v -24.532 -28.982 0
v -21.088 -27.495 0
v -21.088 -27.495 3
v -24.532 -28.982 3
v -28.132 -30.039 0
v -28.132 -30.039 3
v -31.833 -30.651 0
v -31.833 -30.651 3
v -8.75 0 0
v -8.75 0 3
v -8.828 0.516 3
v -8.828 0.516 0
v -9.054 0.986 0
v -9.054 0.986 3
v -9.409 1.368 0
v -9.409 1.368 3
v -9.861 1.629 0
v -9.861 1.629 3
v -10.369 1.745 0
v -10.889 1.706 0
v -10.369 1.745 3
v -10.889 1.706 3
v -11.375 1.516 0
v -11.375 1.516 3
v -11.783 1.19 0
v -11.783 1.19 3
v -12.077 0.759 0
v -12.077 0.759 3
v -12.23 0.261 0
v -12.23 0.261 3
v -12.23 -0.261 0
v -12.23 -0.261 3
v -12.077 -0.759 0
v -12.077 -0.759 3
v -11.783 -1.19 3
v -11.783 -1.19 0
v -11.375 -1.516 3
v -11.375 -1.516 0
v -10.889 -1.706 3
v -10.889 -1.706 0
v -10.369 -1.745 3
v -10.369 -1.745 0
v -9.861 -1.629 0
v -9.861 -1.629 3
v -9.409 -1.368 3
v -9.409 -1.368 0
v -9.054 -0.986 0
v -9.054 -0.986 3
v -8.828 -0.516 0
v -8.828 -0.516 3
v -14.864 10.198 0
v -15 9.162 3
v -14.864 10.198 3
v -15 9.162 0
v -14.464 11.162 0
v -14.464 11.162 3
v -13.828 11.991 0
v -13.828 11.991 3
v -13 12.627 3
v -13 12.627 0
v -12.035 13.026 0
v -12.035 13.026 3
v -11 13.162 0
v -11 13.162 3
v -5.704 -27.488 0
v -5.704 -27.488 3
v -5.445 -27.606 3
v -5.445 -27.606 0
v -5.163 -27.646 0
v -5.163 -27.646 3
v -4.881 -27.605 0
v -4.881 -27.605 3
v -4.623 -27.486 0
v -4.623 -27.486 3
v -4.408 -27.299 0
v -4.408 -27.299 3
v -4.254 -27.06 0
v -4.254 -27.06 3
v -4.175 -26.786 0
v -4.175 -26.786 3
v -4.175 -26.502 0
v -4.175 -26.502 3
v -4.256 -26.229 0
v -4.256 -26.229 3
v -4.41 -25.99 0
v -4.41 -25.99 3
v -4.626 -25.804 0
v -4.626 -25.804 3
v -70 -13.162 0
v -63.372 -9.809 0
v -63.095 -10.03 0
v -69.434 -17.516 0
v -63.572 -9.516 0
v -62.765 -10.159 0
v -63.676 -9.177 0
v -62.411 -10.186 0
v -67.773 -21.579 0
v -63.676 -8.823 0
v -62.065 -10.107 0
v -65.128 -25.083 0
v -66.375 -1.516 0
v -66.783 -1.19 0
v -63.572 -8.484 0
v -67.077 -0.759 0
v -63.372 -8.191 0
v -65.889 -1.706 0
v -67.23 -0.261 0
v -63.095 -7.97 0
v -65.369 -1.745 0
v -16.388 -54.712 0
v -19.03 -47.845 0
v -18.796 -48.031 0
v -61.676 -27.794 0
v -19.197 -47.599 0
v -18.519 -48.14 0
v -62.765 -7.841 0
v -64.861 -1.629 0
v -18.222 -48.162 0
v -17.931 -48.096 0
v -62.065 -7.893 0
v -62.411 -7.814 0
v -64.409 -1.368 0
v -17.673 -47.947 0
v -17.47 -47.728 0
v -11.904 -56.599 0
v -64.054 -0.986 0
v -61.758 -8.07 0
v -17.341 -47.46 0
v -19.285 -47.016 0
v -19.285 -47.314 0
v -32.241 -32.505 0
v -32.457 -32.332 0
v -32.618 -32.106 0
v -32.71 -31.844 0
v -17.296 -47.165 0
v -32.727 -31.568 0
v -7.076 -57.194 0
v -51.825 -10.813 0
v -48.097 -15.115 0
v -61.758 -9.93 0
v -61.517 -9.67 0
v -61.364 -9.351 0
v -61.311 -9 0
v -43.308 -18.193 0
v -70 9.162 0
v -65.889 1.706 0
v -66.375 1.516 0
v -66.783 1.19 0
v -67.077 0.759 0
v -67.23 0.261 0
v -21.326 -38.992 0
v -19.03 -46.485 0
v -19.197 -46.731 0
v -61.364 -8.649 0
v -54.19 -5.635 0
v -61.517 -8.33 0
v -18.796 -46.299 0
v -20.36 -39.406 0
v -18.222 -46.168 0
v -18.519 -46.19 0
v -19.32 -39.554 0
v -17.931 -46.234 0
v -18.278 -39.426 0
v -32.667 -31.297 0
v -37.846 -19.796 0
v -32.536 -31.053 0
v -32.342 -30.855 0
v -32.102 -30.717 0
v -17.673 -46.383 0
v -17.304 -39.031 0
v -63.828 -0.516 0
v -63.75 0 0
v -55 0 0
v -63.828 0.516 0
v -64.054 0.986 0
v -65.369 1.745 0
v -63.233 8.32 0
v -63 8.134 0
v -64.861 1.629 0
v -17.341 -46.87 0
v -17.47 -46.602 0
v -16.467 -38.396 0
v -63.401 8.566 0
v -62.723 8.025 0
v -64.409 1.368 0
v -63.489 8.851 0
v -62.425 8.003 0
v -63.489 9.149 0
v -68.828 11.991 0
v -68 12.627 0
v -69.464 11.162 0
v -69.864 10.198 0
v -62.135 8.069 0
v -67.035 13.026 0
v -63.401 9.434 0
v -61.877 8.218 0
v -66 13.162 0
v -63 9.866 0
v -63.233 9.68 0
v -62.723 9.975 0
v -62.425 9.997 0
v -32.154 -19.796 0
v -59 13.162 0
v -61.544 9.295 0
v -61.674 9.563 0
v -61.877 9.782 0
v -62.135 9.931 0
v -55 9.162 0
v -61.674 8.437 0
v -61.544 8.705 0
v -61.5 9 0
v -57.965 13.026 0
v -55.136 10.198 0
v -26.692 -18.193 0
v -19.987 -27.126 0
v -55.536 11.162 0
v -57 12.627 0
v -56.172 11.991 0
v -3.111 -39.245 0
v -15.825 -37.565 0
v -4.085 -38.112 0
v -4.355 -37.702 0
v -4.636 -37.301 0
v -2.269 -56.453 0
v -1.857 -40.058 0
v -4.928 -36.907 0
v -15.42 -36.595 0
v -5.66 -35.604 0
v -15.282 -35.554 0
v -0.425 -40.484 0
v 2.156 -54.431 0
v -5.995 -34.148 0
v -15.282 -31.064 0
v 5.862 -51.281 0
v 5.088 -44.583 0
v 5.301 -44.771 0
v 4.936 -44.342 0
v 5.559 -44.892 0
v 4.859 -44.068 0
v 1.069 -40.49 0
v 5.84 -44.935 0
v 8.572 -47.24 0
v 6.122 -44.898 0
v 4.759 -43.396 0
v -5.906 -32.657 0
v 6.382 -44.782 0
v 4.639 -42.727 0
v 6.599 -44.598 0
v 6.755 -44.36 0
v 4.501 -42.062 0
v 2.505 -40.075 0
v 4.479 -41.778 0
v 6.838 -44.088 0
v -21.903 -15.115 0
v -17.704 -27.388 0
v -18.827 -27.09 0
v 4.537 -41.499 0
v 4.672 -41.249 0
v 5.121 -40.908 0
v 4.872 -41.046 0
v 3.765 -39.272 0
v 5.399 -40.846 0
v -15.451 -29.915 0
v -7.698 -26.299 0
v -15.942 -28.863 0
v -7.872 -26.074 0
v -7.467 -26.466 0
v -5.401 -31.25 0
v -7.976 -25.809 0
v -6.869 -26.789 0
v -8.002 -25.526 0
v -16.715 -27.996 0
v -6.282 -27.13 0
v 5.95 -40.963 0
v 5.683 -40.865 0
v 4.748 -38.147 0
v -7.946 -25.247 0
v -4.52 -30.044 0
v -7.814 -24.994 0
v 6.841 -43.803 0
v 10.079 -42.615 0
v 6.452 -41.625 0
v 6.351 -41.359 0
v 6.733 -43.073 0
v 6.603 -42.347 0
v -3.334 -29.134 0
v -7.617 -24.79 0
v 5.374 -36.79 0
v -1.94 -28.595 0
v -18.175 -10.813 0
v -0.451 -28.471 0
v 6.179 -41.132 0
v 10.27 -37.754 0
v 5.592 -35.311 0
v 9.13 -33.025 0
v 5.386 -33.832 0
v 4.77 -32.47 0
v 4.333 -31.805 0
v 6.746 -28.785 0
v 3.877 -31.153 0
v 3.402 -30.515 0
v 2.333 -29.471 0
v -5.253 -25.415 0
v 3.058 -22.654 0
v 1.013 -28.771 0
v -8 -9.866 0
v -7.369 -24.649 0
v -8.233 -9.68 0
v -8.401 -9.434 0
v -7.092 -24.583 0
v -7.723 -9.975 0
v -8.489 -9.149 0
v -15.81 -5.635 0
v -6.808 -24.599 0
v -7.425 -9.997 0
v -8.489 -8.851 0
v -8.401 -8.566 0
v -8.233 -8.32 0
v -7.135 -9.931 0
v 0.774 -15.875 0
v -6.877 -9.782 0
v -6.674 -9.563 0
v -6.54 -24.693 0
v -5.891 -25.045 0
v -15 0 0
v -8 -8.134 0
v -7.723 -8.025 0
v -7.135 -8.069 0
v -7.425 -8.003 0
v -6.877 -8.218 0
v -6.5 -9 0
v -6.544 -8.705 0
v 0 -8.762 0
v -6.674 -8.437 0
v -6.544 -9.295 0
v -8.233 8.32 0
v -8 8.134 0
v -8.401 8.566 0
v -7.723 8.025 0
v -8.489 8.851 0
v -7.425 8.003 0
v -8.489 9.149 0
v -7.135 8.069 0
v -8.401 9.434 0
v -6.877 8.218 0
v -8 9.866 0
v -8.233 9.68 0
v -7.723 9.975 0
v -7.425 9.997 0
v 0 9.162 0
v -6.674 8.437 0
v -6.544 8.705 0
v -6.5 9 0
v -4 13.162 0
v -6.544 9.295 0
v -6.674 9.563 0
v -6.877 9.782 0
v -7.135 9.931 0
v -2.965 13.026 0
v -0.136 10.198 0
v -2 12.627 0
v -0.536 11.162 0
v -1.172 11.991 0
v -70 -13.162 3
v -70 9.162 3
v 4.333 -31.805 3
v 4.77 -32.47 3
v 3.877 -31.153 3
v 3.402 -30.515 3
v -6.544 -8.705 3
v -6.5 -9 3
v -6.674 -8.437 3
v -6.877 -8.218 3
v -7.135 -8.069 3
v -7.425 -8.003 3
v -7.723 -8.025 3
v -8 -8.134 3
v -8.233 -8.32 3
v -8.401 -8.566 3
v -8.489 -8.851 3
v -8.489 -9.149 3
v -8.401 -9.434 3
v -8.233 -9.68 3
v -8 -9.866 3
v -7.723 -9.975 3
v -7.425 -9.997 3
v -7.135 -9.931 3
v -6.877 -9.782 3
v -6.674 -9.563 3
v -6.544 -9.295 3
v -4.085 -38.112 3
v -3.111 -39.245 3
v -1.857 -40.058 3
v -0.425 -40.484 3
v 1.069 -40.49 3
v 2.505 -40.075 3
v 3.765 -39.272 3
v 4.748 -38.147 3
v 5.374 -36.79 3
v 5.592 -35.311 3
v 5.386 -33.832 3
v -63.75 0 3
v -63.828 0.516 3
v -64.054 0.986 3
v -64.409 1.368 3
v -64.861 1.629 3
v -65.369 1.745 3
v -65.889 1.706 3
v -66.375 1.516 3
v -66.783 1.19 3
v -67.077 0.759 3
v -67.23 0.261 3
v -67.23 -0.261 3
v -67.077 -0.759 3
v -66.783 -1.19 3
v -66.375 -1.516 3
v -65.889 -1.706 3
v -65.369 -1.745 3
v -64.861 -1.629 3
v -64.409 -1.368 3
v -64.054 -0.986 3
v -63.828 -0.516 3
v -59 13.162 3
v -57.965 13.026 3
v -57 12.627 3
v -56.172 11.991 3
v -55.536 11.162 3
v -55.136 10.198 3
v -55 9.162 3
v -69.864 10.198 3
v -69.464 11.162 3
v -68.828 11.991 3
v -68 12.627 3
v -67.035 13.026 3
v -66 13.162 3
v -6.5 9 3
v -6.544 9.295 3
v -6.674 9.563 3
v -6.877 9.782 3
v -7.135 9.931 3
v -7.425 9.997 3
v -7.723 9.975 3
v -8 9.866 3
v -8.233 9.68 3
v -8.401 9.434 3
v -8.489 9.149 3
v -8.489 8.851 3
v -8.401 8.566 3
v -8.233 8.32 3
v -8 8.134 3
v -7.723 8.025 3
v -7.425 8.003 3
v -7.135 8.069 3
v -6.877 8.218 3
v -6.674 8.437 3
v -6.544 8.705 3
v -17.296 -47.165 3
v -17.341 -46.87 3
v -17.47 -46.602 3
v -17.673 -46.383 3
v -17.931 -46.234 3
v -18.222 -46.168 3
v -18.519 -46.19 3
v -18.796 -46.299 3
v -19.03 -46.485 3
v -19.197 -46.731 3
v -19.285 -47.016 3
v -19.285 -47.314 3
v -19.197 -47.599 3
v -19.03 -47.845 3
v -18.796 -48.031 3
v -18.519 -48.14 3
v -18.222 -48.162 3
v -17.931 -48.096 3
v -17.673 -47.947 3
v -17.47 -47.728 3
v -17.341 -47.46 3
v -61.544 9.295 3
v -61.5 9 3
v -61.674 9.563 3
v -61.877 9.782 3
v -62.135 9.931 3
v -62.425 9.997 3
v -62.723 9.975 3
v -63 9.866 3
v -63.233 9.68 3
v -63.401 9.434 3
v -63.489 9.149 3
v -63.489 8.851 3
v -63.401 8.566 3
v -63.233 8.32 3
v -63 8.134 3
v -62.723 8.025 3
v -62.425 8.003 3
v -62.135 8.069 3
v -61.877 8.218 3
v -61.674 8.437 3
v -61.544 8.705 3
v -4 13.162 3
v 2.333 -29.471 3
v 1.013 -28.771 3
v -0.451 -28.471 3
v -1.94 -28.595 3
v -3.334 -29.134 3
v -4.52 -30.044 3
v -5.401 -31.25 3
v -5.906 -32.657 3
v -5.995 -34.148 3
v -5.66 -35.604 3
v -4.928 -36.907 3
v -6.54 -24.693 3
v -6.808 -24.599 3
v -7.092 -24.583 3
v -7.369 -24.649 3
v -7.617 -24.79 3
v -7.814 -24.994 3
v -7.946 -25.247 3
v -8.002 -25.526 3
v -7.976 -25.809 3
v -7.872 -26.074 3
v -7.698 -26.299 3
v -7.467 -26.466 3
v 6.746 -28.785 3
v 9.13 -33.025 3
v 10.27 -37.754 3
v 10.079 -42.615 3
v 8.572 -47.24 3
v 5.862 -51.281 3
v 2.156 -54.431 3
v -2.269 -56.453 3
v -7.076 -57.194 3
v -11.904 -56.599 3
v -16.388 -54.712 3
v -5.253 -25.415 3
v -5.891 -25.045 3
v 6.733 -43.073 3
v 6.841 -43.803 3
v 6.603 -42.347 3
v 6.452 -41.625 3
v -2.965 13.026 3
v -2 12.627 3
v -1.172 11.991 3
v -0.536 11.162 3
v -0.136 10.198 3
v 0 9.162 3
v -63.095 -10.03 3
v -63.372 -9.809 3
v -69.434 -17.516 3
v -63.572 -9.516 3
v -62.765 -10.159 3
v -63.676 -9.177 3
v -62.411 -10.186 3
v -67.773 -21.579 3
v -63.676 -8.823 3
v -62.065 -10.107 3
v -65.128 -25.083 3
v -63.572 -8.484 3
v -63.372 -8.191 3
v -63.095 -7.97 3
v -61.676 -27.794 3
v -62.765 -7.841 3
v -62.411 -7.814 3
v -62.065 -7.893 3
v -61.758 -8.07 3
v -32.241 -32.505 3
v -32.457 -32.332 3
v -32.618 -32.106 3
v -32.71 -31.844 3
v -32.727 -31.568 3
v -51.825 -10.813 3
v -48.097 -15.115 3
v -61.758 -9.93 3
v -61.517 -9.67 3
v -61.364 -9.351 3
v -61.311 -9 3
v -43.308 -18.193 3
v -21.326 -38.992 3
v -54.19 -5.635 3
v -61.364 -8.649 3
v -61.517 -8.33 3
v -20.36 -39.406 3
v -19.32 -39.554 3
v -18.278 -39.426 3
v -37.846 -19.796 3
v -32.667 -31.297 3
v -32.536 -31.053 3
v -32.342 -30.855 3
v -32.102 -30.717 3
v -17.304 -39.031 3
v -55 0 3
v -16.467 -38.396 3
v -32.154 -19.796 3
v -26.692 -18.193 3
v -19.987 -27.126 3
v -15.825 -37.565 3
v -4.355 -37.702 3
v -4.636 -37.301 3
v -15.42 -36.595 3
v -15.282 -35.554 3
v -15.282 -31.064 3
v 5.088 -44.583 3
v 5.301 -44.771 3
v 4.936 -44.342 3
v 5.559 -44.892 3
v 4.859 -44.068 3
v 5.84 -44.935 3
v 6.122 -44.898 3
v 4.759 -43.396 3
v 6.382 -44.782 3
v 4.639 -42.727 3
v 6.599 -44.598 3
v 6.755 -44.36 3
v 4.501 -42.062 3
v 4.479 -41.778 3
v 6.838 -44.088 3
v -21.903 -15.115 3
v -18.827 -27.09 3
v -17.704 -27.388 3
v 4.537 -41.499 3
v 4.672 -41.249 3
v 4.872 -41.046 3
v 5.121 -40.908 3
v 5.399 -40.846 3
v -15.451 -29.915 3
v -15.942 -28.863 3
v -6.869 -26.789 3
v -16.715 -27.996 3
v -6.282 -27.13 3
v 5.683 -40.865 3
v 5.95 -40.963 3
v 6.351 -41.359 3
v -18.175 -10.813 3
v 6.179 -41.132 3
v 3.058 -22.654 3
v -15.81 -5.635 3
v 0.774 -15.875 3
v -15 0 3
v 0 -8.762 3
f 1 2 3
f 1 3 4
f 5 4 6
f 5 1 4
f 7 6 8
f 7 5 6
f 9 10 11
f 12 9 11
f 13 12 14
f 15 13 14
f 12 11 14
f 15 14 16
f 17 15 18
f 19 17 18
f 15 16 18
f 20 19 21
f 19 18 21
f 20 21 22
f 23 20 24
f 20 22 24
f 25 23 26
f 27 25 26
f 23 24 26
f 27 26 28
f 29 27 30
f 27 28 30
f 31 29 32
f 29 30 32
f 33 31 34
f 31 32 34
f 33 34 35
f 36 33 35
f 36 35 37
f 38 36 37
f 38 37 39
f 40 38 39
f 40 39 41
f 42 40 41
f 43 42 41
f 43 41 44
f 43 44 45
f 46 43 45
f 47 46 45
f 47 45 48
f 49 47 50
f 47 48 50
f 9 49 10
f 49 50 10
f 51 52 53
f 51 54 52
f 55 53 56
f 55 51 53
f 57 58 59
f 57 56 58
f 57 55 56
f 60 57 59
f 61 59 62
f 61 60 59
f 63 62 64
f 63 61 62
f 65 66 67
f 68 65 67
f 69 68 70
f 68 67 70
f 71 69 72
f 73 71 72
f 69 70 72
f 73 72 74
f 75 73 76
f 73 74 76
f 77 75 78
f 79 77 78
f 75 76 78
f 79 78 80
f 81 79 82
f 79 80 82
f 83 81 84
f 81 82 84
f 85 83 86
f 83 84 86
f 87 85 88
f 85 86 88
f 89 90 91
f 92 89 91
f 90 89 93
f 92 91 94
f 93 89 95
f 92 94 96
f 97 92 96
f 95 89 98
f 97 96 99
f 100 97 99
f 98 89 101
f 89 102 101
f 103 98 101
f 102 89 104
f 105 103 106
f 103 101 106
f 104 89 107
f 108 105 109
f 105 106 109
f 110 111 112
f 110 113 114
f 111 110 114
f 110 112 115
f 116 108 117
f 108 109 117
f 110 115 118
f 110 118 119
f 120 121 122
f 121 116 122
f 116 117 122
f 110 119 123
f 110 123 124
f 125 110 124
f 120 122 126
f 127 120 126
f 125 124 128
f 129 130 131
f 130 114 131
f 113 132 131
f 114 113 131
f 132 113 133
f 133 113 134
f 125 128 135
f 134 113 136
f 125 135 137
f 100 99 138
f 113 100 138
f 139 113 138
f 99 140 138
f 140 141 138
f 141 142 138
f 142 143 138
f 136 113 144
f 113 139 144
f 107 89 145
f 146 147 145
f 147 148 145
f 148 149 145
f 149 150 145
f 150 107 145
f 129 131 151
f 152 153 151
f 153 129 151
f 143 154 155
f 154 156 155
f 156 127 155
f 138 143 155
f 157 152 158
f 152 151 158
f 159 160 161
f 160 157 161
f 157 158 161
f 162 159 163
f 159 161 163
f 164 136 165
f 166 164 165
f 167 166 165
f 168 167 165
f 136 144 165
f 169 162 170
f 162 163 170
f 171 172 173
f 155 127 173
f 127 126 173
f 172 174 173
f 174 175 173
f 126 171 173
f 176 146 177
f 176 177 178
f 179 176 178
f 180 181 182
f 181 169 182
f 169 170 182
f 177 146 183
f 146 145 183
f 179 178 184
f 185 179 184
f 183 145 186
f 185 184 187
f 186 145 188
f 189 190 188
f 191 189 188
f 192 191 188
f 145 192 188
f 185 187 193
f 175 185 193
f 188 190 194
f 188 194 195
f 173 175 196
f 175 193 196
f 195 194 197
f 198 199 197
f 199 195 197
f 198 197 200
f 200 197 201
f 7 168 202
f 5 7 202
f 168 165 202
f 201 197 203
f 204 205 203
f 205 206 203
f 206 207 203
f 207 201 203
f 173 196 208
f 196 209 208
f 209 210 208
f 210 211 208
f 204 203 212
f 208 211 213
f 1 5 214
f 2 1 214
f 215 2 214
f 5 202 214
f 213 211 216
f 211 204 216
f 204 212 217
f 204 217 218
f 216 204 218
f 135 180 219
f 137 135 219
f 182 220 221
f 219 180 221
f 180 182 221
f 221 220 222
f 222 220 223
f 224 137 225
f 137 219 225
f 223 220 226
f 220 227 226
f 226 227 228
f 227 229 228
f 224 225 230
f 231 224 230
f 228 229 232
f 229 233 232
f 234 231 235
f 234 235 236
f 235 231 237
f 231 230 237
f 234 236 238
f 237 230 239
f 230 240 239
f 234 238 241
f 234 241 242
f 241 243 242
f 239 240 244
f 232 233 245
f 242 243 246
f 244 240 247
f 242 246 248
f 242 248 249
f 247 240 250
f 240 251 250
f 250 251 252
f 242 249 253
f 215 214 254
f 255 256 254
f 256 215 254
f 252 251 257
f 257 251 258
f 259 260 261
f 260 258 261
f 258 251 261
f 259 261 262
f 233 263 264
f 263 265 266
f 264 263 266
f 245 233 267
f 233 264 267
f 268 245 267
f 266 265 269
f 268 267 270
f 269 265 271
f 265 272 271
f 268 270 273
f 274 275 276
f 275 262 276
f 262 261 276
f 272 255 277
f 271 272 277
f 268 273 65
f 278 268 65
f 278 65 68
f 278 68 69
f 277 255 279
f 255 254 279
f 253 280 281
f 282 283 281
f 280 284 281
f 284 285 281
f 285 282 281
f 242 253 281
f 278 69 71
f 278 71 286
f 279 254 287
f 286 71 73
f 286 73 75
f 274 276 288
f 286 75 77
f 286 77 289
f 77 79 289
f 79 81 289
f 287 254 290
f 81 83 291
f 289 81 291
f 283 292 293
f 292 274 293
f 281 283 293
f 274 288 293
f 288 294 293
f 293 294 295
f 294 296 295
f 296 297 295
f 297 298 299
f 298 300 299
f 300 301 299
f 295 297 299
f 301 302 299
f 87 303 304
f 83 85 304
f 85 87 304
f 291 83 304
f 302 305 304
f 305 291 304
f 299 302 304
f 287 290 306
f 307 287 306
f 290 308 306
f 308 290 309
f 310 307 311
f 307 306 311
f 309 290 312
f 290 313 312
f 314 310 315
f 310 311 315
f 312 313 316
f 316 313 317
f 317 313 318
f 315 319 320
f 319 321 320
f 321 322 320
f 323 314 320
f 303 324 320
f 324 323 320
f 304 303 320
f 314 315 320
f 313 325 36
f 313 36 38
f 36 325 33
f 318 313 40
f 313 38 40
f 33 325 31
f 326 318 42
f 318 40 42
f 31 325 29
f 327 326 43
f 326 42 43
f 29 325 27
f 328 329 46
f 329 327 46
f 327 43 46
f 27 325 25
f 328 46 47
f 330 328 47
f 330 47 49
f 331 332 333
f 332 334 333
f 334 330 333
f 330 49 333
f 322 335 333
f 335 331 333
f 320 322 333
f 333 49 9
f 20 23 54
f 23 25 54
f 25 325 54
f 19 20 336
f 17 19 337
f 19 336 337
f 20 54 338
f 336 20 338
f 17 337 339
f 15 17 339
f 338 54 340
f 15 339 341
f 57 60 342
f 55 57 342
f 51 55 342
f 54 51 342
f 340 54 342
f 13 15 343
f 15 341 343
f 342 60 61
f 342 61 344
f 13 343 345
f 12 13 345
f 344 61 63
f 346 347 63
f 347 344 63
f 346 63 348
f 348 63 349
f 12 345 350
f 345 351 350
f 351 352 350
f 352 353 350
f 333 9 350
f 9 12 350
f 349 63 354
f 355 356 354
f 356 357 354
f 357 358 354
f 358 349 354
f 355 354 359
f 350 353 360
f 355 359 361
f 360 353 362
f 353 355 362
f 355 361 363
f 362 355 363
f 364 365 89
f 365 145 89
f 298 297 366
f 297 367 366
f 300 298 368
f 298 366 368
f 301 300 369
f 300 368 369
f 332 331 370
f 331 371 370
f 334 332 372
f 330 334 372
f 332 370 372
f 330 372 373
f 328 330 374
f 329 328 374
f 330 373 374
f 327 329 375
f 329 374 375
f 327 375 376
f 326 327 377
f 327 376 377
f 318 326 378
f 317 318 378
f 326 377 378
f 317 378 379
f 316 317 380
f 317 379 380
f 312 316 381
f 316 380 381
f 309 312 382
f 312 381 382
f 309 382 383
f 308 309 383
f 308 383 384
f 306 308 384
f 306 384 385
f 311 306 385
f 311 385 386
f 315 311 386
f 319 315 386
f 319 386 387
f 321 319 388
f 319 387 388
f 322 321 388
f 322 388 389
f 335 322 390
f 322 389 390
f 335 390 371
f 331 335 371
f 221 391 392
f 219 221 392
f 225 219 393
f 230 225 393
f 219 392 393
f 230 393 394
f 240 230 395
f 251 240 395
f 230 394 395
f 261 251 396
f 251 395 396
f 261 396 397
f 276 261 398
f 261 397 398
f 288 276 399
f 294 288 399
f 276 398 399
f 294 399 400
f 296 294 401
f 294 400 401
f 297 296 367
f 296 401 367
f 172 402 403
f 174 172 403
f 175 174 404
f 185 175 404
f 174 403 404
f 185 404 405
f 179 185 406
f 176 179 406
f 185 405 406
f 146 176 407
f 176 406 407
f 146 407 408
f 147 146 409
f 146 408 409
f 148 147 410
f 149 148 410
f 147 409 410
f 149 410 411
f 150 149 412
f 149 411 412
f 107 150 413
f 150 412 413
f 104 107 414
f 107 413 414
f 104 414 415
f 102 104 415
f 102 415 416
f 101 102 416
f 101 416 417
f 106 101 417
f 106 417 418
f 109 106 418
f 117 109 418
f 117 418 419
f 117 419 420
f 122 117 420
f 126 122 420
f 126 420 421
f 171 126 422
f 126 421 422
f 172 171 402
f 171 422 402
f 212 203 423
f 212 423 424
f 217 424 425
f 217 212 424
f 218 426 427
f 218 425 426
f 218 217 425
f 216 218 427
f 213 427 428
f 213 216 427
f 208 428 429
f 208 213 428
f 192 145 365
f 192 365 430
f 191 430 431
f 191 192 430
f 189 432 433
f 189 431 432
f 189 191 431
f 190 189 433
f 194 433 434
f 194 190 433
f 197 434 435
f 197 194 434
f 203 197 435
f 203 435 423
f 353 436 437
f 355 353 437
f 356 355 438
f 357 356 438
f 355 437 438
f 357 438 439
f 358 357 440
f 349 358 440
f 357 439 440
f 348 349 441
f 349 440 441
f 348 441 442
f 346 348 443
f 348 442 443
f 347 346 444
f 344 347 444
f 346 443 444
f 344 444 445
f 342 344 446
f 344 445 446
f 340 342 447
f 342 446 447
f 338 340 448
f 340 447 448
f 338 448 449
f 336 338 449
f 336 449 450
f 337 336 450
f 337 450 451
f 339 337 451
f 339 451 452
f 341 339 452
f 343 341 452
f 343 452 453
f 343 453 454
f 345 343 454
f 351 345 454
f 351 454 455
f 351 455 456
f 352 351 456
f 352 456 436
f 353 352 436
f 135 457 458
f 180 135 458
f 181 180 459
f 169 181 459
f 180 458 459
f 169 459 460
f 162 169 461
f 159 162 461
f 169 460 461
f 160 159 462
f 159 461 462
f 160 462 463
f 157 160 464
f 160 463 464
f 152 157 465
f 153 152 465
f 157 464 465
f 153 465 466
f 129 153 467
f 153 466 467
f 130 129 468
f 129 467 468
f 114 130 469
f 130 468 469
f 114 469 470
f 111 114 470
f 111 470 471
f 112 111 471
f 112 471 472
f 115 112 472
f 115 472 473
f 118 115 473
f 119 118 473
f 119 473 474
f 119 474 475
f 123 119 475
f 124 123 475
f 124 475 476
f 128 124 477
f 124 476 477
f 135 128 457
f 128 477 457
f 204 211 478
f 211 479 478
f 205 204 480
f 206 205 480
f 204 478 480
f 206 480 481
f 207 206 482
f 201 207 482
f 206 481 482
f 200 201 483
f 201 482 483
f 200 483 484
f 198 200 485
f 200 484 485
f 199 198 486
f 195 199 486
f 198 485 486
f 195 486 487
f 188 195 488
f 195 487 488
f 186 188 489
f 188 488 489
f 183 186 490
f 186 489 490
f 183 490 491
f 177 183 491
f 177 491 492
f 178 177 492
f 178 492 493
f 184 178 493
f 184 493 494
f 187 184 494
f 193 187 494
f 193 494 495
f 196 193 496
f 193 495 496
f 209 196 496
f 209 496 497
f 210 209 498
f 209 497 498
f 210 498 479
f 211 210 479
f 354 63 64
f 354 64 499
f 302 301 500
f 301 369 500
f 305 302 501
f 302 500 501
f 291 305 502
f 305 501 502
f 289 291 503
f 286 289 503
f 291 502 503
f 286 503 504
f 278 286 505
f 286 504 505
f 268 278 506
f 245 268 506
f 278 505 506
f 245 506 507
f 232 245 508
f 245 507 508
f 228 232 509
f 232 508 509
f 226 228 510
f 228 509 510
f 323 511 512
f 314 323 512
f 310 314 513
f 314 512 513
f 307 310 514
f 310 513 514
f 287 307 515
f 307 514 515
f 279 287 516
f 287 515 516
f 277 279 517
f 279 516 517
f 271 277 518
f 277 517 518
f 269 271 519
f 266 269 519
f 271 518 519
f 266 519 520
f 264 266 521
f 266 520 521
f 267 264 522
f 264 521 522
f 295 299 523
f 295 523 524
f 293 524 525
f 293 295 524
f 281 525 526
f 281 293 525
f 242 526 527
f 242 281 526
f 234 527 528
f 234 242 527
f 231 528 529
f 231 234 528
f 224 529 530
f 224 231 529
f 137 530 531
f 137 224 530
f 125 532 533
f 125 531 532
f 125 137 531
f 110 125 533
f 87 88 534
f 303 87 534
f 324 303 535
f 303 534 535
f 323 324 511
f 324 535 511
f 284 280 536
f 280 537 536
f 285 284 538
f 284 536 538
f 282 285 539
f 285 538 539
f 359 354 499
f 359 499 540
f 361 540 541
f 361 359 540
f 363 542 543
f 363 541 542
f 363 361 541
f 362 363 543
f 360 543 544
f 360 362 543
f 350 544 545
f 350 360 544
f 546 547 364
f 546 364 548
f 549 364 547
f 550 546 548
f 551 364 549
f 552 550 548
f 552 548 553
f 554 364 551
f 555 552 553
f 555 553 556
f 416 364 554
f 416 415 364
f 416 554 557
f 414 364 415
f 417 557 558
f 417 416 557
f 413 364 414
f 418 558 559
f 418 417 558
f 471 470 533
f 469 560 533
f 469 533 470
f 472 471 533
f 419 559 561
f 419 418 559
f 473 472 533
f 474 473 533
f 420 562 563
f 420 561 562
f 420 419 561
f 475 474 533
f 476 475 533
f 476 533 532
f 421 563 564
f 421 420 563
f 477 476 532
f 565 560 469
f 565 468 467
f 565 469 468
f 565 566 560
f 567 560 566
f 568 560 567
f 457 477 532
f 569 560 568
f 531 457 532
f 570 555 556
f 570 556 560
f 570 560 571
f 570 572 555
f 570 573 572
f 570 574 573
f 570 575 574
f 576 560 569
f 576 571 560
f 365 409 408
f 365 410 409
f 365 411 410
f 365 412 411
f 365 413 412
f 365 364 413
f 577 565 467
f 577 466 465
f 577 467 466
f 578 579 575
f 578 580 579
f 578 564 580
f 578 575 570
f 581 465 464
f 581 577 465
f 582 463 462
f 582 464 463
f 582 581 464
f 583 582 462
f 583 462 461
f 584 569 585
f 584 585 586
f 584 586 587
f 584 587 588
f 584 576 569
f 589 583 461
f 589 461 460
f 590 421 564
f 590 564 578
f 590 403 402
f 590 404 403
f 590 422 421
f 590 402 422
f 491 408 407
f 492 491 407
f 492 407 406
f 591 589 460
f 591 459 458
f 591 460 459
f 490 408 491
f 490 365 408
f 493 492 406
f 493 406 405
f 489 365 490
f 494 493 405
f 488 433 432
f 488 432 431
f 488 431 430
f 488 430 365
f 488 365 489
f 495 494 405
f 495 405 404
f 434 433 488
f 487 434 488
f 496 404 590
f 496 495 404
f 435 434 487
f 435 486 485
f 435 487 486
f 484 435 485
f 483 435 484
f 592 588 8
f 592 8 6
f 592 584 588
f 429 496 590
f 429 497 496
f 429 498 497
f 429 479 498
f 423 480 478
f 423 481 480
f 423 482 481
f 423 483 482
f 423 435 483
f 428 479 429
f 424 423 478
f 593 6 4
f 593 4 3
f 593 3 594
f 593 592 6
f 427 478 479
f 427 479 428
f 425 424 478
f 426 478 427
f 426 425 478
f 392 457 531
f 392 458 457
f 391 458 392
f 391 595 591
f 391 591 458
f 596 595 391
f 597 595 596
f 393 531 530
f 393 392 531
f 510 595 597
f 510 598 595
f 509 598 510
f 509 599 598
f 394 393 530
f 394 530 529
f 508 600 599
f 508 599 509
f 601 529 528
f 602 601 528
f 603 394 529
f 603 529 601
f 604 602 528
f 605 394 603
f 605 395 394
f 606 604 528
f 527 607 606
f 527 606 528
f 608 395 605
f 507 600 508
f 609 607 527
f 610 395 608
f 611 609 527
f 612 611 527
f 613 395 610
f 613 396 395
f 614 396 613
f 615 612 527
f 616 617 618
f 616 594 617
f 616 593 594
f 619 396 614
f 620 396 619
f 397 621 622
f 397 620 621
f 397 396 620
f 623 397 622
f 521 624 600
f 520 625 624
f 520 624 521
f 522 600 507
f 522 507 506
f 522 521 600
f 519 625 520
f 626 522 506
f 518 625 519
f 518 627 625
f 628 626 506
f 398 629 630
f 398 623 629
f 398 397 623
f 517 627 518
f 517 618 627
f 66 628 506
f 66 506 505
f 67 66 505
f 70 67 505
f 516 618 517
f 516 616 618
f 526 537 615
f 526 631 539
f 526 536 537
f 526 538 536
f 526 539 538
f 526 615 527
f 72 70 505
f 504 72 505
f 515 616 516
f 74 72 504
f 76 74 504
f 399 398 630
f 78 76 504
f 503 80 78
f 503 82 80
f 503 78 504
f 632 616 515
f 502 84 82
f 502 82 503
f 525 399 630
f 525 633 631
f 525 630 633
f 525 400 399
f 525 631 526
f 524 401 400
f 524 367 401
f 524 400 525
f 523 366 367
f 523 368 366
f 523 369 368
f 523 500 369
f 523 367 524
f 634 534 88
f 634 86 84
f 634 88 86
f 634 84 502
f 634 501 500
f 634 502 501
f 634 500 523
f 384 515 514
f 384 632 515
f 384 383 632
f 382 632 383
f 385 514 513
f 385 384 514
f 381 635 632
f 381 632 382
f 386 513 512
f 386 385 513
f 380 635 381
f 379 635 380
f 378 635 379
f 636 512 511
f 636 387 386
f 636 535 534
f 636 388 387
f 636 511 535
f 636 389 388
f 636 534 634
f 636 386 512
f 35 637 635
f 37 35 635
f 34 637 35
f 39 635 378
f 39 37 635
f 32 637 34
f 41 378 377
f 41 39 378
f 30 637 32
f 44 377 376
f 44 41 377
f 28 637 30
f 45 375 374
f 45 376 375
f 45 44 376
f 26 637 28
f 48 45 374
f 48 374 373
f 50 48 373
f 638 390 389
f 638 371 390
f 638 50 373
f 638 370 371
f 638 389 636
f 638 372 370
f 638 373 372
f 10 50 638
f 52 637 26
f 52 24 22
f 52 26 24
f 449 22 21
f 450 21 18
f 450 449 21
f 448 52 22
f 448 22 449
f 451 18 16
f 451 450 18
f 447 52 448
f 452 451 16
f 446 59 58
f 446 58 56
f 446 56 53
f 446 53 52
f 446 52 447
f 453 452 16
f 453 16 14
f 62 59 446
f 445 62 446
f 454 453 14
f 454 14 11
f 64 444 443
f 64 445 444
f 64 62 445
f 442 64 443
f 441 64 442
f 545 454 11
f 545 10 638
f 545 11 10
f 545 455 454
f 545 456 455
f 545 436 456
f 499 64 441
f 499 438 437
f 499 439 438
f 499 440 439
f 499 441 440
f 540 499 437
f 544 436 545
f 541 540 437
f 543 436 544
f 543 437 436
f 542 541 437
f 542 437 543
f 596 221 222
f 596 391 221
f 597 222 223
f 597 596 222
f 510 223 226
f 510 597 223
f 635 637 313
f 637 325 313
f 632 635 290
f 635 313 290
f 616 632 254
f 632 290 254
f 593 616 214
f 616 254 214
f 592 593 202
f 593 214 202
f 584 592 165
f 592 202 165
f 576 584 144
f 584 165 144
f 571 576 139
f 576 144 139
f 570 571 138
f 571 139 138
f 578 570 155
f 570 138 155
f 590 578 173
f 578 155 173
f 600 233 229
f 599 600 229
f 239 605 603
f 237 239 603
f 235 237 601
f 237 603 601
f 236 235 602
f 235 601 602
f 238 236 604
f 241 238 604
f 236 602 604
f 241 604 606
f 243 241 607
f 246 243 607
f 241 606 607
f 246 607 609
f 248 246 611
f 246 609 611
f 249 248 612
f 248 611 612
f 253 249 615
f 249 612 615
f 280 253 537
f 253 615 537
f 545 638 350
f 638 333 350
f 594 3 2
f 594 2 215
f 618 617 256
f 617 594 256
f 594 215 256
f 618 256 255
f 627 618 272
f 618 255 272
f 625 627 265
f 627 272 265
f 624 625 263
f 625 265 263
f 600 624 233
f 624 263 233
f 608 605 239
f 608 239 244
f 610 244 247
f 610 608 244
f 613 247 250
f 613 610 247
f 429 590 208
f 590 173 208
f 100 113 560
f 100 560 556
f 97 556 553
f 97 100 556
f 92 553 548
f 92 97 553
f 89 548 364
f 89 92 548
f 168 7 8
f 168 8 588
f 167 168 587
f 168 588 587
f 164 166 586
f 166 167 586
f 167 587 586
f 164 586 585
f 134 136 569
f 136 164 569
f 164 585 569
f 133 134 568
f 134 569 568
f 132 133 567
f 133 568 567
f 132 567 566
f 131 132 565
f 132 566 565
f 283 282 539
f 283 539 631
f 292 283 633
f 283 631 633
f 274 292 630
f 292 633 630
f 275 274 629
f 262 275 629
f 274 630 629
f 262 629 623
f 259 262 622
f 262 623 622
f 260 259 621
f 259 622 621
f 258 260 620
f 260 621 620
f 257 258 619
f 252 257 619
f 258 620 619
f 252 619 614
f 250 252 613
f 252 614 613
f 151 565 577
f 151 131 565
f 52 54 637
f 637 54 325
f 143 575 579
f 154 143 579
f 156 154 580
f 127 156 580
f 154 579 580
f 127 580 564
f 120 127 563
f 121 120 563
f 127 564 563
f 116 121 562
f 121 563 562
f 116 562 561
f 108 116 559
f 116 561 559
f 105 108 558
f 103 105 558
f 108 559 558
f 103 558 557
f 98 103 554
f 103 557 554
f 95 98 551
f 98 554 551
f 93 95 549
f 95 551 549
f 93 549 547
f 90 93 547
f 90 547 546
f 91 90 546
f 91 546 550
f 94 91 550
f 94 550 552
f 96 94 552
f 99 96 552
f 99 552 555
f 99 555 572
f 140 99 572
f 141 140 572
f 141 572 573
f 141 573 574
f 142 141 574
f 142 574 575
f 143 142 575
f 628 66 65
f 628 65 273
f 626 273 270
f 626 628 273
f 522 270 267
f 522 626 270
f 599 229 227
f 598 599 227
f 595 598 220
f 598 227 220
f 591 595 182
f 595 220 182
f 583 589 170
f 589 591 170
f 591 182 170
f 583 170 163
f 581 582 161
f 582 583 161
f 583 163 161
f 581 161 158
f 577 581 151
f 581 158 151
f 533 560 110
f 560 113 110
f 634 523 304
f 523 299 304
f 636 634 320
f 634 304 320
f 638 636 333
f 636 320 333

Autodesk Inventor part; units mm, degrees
ref_plane "YZ Plane" through (0, 0, 0) normal (1, 0, 0) x (0, 1, 0)
ref_plane "XZ Plane" through (0, 0, 0) normal (0, 1, 0) x (-1, 0, 0)
ref_plane "XY Plane" through (0, 0, 0) normal (0, 0, 1) x (1, 0, 0)
sketch "Sketch1" plane through (0, 0, 0) normal (0, 0, 1) x (1, 0, 0)
  circle A0 centre (-18.2965, -47.165) radius 1.2295 construction
  circle A1 centre (-6.0724, -26.0926) radius 1.2295 construction
  circle A2 centre (5.6859, -42.8853) radius 1.2295 construction
  circle A3 centre (-0.1932, -34.489) radius 6 construction
  circle A4 centre (-7.5, -9) radius 1.621 construction
  circle A5 centre (-10.5, 0) radius 2.067 construction
  circle A6 centre (-7.5, 9) radius 1.621 construction
  circle A7 centre (-35, 0) radius 4 construction
  circle A8 centre (-62.5, 9) radius 1.621 construction
  line L0 (-55, -16) -> (-55, 16) construction
  circle A9 centre (-65.5, 0) radius 2.067 construction
  circle A10 centre (-62.5, -9) radius 1.621 construction
  circle A11 centre (-65.5, 0) radius 2.067 construction
  circle A12 centre (-62.5, 9) radius 1.7295 construction
  circle A13 centre (-62.5, -9) radius 1.7295 construction
  line L1 (-70, 13.1624) -> (-55, 13.1624) construction
  line L2 (-70, -13.1624) -> (-70, 13.1624) construction
  line L3 (-55, -13.1624) -> (-70, -13.1624) construction
  line L4 (-55, 13.1624) -> (-55, -13.1624) construction
  circle A14 centre (-10.5, 0) radius 2.067 construction
  circle A15 centre (-7.5, -9) radius 1.621 construction
  circle A16 centre (-7.5, 9) radius 1.621 construction
  line L5 (-15, 13.1624) -> (0, 13.1624) construction
  line L6 (-15, -13.1624) -> (-15, 13.1624) construction
  line L7 (0, -13.1624) -> (-15, -13.1624) construction
  line L8 (0, 13.1624) -> (0, -13.1624) construction
  arc A17 (4.363, -44.1343) -> (4.0127, -42.1709) centre (-18.2965, -47.165) ccw
  arc A18 (7.3366, -43.7366) -> (6.9402, -41.5156) centre (-18.2965, -47.165) ccw
  arc A19 (-5.9734, -27.9093) -> (-7.6985, -26.9086) centre (-18.2965, -47.165) ccw
  arc A20 (-4.3563, -25.3825) -> (-6.3078, -24.2504) centre (-18.2965, -47.165) ccw
  arc A21 (-4.9287, -38.6488) -> (-5.7218, -37.5161) centre (-18.2965, -47.165) ccw
  arc A22 (5.6137, -31.9325) -> (4.1951, -29.9066) centre (-18.2965, -47.165) ccw
  arc A23 (-5.1648, -26.6459) -> (-7.0032, -25.5795) centre (-18.2965, -47.165) ccw construction
  arc A24 (0.3425, -35.2907) -> (-0.7634, -33.7114) centre (-18.2965, -47.165) ccw construction
  arc A25 (5.8498, -43.9354) -> (5.4764, -41.8432) centre (-18.2965, -47.165) ccw construction
  arc A26 (6.9402, -41.5156) -> (4.0127, -42.1709) centre (5.4764, -41.8432) ccw
  arc A27 (4.363, -44.1343) -> (7.3366, -43.7366) centre (5.8498, -43.9354) ccw
  arc A28 (-4.9287, -38.6488) -> (5.6137, -31.9325) centre (0.3425, -35.2907) ccw
  arc A29 (4.1951, -29.9066) -> (-5.7218, -37.5161) centre (-0.7634, -33.7114) ccw
  arc A30 (-5.9734, -27.9093) -> (-4.3563, -25.3825) centre (-5.1648, -26.6459) ccw
  arc A31 (-6.3078, -24.2504) -> (-7.6985, -26.9086) centre (-7.0032, -25.5795) ccw
  circle A32 centre (-18.2965, -47.165) radius 1.5
  circle A33 centre (-7.5, -9) radius 2
  circle A34 centre (-7.5, 9) radius 2
  circle A35 centre (-10.5, 0) radius 2.5
  circle A36 centre (-62.5, 9) radius 2
  circle A37 centre (-65.5, 0) radius 2.5
  circle A38 centre (-62.5, -9) radius 2
  circle A39 centre (-7.3444, -39.4963) radius 17.7 construction
  arc A40 (-16.3879, -54.7116) -> (6.7463, -28.7846) centre (-7.3444, -39.4963) ccw
  arc A41 (0, -8.7624) -> (6.7463, -28.7846) centre (33.0845, -8.7624) ccw
  line L9 (0, -8.7624) -> (0, 9.1624)
  line L10 (-11, 13.1624) -> (-4, 13.1624)
  line L11 (-15, 9.1624) -> (-15, 0)
  line L12 (-55, 0) -> (-55, 9.1624)
  line L13 (-66, 13.1624) -> (-59, 13.1624)
  line L14 (-70, 9.1624) -> (-70, -13.1624)
  arc A42 (-55, 0) -> (-15, 0) centre (-35, 0) ccw
  arc A43 (-66, 13.1624) -> (-70, 9.1624) centre (-66, 9.1624) ccw
  arc A44 (-55, 9.1624) -> (-59, 13.1624) centre (-59, 9.1624) ccw
  arc A45 (-11, 13.1624) -> (-15, 9.1624) centre (-11, 9.1624) ccw
  arc A46 (0, 9.1624) -> (-4, 13.1624) centre (-4, 9.1624) ccw
  line L15 (-61.6755, -27.7942) -> (-16.3879, -54.7116)
  arc A47 (-70, -13.1624) -> (-61.6755, -27.7942) centre (-52.9789, -13.1624) ccw
  arc A48 (-35.0864, -30.8138) -> (-21.0883, -27.4948) centre (-35, 0) ccw
  line L16 (-35.0864, -30.8138) -> (-21.3261, -38.9925)
  line L17 (-15.2824, -31.0639) -> (-15.2824, -35.554)
  arc A49 (-15.2824, -31.0639) -> (-21.0883, -27.4948) centre (-19.2824, -31.0639) ccw
  arc A50 (-21.3261, -38.9925) -> (-15.2824, -35.554) centre (-19.2824, -35.554) ccw
  point P0 (0, 0)
  point P1 (-15.2824, -23.6794)
  dimension "d0" = 3
  dimension "d1" = 5
  dimension "d2" = 5
  dimension "d3" = 5
  dimension "d4" = 12.5
  dimension "d5" = 3
  dimension "d6" = 4
  dimension "d7" = 4
  dimension "d8" = 5
  dimension "d9" = 4
  dimension "d10" = 5
  dimension "d11" = 4
  dimension "d12" = 4
  dimension "d15" = 4
extrude "Extrusion1" add sketch "Sketch1" along normal blind 3
sketch "Sketch2" plane through (0, 0, 3) normal (0, 0, 1) x (1, 0, 0)
  arc A0 (4.1951, -29.9066) -> (-5.7218, -37.5161) centre (-0.7634, -33.7114) ccw projected
  arc A1 (5.6137, -31.9325) -> (4.1951, -29.9066) centre (-18.2965, -47.165) ccw projected
  arc A2 (-4.9287, -38.6488) -> (5.6137, -31.9325) centre (0.3425, -35.2907) ccw projected
  arc A3 (-4.9287, -38.6488) -> (-5.7218, -37.5161) centre (-18.2965, -47.165) ccw projected
  arc A4 (-35.0864, -30.8138) -> (-21.0883, -27.4948) centre (-35, 0) ccw projected
  arc A5 (-15.2824, -31.0639) -> (-21.0883, -27.4948) centre (-19.2824, -31.0639) ccw projected
  line L0 (-15.2824, -31.0639) -> (-15.2824, -35.554) projected
  arc A6 (-21.3261, -38.9925) -> (-15.2824, -35.554) centre (-19.2824, -35.554) ccw projected
  line L1 (-21.3261, -38.9925) -> (-35.0864, -30.8138) projected
  circle A7 centre (-65.5, 0) radius 2.5 projected
  circle A8 centre (-10.5, 0) radius 2.5 projected
  arc A9 (-6.3078, -24.2504) -> (-7.6985, -26.9086) centre (-7.0032, -25.5795) ccw projected
  arc A10 (-4.3563, -25.3825) -> (-6.3078, -24.2504) centre (-18.2965, -47.165) ccw projected
  arc A11 (-5.9734, -27.9093) -> (-4.3563, -25.3825) centre (-5.1648, -26.6459) ccw projected
  arc A12 (-5.9734, -27.9093) -> (-7.6985, -26.9086) centre (-18.2965, -47.165) ccw projected
  arc A13 (6.9402, -41.5156) -> (4.0127, -42.1709) centre (5.4764, -41.8432) ccw projected
  arc A14 (7.3366, -43.7366) -> (6.9402, -41.5156) centre (-18.2965, -47.165) ccw projected
  arc A15 (4.363, -44.1343) -> (7.3366, -43.7366) centre (5.8498, -43.9354) ccw projected
  arc A16 (4.363, -44.1343) -> (4.0127, -42.1709) centre (-18.2965, -47.165) ccw projected
  circle A17 centre (-62.5, -9) radius 2 projected
  circle A18 centre (-62.5, 9) radius 2 projected
  circle A19 centre (-7.5, 9) radius 2 projected
  circle A20 centre (-7.5, -9) radius 2 projected
  circle A21 centre (-18.2965, -47.165) radius 1.5 projected
  line L2 (-70, 9.1624) -> (-70, -13.1624) projected
  arc A22 (-70, -13.1624) -> (-61.6755, -27.7942) centre (-52.9789, -13.1624) ccw projected
  line L3 (-61.6755, -27.7942) -> (-16.3879, -54.7116) projected
  arc A23 (-16.3879, -54.7116) -> (6.7463, -28.7846) centre (-7.3444, -39.4963) ccw projected
  arc A24 (0, -8.7624) -> (6.7463, -28.7846) centre (33.0845, -8.7624) ccw projected
  line L4 (0, -8.7624) -> (0, 9.1624) projected
  arc A25 (0, 9.1624) -> (-4, 13.1624) centre (-4, 9.1624) ccw projected
  line L5 (-4, 13.1624) -> (-11, 13.1624) projected
  arc A26 (-11, 13.1624) -> (-15, 9.1624) centre (-11, 9.1624) ccw projected
  line L6 (-15, 9.1624) -> (-15, 0) projected
  arc A27 (-55, 0) -> (-15, 0) centre (-35, 0) ccw projected
  line L7 (-55, 0) -> (-55, 9.1624) projected
  arc A28 (-55, 9.1624) -> (-59, 13.1624) centre (-59, 9.1624) ccw projected
  line L8 (-59, 13.1624) -> (-66, 13.1624) projected
  arc A29 (-66, 13.1624) -> (-70, 9.1624) centre (-66, 9.1624) ccw projected
  circle A30 centre (-62.5, 9) radius 1
  circle A31 centre (-65.5, 0) radius 1.75
  circle A32 centre (-62.5, -9) radius 2 projected
  circle A33 centre (-62.5, -9) radius 1.1893
  circle A34 centre (-62.5, 9) radius 2
  circle A35 centre (-65.5, 0) radius 2.5
  circle A36 centre (-18.2965, -47.165) radius 1
  circle A37 centre (-7.5, -9) radius 1
  circle A38 centre (-7.5, 9) radius 1
  circle A39 centre (-10.5, 0) radius 1.75
  arc A40 (3.4017, -30.5154) -> (-4.9285, -36.9074) centre (-0.7634, -33.7114) ccw
  arc A41 (4.7703, -32.4698) -> (3.4017, -30.5154) centre (-18.2965, -47.165) ccw
  arc A42 (-4.0853, -38.1115) -> (4.7703, -32.4698) centre (0.3425, -35.2907) ccw
  arc A43 (-4.0853, -38.1115) -> (-4.9285, -36.9074) centre (-18.2965, -47.165) ccw
  arc A44 (6.4523, -41.6248) -> (4.5006, -42.0617) centre (5.4764, -41.8432) ccw
  arc A45 (6.841, -43.8029) -> (6.4523, -41.6248) centre (-18.2965, -47.165) ccw
  arc A46 (4.8586, -44.068) -> (6.841, -43.8029) centre (5.8498, -43.9354) ccw
  arc A47 (4.8586, -44.068) -> (4.5006, -42.0617) centre (-18.2965, -47.165) ccw
  arc A48 (-4.6258, -25.8036) -> (-6.5396, -24.6934) centre (-18.2965, -47.165) ccw
  arc A49 (-6.5396, -24.6934) -> (-7.4667, -26.4655) centre (-7.0032, -25.5795) ccw
  arc A50 (-5.7039, -27.4882) -> (-7.4667, -26.4655) centre (-18.2965, -47.165) ccw
  arc A51 (-5.7039, -27.4882) -> (-4.6258, -25.8036) centre (-5.1648, -26.6459) ccw
  point P0 (0, 0)
  dimension "d16" = 3.5
  dimension "d17" = 2
  dimension "d20" = 2
  dimension "d21" = 2
  dimension "d22" = 2
  dimension "d23" = 3.5
  dimension "d25" = 1
  dimension "d26" = 0.5
  dimension "d27" = 0.5
extrude "Extrusion2" add sketch "Sketch2" against normal up to surface (3 mm away) contours A1 A2 A3 A0 | A7 | A8 | A10 A11 A12 A9 | A14 A15 A16 A13 | A17 | A18 | A19 | A20 | A21
fillet "Fillet1" radius 1 1 edges at (-35.0864, -30.8138, 1.5)
